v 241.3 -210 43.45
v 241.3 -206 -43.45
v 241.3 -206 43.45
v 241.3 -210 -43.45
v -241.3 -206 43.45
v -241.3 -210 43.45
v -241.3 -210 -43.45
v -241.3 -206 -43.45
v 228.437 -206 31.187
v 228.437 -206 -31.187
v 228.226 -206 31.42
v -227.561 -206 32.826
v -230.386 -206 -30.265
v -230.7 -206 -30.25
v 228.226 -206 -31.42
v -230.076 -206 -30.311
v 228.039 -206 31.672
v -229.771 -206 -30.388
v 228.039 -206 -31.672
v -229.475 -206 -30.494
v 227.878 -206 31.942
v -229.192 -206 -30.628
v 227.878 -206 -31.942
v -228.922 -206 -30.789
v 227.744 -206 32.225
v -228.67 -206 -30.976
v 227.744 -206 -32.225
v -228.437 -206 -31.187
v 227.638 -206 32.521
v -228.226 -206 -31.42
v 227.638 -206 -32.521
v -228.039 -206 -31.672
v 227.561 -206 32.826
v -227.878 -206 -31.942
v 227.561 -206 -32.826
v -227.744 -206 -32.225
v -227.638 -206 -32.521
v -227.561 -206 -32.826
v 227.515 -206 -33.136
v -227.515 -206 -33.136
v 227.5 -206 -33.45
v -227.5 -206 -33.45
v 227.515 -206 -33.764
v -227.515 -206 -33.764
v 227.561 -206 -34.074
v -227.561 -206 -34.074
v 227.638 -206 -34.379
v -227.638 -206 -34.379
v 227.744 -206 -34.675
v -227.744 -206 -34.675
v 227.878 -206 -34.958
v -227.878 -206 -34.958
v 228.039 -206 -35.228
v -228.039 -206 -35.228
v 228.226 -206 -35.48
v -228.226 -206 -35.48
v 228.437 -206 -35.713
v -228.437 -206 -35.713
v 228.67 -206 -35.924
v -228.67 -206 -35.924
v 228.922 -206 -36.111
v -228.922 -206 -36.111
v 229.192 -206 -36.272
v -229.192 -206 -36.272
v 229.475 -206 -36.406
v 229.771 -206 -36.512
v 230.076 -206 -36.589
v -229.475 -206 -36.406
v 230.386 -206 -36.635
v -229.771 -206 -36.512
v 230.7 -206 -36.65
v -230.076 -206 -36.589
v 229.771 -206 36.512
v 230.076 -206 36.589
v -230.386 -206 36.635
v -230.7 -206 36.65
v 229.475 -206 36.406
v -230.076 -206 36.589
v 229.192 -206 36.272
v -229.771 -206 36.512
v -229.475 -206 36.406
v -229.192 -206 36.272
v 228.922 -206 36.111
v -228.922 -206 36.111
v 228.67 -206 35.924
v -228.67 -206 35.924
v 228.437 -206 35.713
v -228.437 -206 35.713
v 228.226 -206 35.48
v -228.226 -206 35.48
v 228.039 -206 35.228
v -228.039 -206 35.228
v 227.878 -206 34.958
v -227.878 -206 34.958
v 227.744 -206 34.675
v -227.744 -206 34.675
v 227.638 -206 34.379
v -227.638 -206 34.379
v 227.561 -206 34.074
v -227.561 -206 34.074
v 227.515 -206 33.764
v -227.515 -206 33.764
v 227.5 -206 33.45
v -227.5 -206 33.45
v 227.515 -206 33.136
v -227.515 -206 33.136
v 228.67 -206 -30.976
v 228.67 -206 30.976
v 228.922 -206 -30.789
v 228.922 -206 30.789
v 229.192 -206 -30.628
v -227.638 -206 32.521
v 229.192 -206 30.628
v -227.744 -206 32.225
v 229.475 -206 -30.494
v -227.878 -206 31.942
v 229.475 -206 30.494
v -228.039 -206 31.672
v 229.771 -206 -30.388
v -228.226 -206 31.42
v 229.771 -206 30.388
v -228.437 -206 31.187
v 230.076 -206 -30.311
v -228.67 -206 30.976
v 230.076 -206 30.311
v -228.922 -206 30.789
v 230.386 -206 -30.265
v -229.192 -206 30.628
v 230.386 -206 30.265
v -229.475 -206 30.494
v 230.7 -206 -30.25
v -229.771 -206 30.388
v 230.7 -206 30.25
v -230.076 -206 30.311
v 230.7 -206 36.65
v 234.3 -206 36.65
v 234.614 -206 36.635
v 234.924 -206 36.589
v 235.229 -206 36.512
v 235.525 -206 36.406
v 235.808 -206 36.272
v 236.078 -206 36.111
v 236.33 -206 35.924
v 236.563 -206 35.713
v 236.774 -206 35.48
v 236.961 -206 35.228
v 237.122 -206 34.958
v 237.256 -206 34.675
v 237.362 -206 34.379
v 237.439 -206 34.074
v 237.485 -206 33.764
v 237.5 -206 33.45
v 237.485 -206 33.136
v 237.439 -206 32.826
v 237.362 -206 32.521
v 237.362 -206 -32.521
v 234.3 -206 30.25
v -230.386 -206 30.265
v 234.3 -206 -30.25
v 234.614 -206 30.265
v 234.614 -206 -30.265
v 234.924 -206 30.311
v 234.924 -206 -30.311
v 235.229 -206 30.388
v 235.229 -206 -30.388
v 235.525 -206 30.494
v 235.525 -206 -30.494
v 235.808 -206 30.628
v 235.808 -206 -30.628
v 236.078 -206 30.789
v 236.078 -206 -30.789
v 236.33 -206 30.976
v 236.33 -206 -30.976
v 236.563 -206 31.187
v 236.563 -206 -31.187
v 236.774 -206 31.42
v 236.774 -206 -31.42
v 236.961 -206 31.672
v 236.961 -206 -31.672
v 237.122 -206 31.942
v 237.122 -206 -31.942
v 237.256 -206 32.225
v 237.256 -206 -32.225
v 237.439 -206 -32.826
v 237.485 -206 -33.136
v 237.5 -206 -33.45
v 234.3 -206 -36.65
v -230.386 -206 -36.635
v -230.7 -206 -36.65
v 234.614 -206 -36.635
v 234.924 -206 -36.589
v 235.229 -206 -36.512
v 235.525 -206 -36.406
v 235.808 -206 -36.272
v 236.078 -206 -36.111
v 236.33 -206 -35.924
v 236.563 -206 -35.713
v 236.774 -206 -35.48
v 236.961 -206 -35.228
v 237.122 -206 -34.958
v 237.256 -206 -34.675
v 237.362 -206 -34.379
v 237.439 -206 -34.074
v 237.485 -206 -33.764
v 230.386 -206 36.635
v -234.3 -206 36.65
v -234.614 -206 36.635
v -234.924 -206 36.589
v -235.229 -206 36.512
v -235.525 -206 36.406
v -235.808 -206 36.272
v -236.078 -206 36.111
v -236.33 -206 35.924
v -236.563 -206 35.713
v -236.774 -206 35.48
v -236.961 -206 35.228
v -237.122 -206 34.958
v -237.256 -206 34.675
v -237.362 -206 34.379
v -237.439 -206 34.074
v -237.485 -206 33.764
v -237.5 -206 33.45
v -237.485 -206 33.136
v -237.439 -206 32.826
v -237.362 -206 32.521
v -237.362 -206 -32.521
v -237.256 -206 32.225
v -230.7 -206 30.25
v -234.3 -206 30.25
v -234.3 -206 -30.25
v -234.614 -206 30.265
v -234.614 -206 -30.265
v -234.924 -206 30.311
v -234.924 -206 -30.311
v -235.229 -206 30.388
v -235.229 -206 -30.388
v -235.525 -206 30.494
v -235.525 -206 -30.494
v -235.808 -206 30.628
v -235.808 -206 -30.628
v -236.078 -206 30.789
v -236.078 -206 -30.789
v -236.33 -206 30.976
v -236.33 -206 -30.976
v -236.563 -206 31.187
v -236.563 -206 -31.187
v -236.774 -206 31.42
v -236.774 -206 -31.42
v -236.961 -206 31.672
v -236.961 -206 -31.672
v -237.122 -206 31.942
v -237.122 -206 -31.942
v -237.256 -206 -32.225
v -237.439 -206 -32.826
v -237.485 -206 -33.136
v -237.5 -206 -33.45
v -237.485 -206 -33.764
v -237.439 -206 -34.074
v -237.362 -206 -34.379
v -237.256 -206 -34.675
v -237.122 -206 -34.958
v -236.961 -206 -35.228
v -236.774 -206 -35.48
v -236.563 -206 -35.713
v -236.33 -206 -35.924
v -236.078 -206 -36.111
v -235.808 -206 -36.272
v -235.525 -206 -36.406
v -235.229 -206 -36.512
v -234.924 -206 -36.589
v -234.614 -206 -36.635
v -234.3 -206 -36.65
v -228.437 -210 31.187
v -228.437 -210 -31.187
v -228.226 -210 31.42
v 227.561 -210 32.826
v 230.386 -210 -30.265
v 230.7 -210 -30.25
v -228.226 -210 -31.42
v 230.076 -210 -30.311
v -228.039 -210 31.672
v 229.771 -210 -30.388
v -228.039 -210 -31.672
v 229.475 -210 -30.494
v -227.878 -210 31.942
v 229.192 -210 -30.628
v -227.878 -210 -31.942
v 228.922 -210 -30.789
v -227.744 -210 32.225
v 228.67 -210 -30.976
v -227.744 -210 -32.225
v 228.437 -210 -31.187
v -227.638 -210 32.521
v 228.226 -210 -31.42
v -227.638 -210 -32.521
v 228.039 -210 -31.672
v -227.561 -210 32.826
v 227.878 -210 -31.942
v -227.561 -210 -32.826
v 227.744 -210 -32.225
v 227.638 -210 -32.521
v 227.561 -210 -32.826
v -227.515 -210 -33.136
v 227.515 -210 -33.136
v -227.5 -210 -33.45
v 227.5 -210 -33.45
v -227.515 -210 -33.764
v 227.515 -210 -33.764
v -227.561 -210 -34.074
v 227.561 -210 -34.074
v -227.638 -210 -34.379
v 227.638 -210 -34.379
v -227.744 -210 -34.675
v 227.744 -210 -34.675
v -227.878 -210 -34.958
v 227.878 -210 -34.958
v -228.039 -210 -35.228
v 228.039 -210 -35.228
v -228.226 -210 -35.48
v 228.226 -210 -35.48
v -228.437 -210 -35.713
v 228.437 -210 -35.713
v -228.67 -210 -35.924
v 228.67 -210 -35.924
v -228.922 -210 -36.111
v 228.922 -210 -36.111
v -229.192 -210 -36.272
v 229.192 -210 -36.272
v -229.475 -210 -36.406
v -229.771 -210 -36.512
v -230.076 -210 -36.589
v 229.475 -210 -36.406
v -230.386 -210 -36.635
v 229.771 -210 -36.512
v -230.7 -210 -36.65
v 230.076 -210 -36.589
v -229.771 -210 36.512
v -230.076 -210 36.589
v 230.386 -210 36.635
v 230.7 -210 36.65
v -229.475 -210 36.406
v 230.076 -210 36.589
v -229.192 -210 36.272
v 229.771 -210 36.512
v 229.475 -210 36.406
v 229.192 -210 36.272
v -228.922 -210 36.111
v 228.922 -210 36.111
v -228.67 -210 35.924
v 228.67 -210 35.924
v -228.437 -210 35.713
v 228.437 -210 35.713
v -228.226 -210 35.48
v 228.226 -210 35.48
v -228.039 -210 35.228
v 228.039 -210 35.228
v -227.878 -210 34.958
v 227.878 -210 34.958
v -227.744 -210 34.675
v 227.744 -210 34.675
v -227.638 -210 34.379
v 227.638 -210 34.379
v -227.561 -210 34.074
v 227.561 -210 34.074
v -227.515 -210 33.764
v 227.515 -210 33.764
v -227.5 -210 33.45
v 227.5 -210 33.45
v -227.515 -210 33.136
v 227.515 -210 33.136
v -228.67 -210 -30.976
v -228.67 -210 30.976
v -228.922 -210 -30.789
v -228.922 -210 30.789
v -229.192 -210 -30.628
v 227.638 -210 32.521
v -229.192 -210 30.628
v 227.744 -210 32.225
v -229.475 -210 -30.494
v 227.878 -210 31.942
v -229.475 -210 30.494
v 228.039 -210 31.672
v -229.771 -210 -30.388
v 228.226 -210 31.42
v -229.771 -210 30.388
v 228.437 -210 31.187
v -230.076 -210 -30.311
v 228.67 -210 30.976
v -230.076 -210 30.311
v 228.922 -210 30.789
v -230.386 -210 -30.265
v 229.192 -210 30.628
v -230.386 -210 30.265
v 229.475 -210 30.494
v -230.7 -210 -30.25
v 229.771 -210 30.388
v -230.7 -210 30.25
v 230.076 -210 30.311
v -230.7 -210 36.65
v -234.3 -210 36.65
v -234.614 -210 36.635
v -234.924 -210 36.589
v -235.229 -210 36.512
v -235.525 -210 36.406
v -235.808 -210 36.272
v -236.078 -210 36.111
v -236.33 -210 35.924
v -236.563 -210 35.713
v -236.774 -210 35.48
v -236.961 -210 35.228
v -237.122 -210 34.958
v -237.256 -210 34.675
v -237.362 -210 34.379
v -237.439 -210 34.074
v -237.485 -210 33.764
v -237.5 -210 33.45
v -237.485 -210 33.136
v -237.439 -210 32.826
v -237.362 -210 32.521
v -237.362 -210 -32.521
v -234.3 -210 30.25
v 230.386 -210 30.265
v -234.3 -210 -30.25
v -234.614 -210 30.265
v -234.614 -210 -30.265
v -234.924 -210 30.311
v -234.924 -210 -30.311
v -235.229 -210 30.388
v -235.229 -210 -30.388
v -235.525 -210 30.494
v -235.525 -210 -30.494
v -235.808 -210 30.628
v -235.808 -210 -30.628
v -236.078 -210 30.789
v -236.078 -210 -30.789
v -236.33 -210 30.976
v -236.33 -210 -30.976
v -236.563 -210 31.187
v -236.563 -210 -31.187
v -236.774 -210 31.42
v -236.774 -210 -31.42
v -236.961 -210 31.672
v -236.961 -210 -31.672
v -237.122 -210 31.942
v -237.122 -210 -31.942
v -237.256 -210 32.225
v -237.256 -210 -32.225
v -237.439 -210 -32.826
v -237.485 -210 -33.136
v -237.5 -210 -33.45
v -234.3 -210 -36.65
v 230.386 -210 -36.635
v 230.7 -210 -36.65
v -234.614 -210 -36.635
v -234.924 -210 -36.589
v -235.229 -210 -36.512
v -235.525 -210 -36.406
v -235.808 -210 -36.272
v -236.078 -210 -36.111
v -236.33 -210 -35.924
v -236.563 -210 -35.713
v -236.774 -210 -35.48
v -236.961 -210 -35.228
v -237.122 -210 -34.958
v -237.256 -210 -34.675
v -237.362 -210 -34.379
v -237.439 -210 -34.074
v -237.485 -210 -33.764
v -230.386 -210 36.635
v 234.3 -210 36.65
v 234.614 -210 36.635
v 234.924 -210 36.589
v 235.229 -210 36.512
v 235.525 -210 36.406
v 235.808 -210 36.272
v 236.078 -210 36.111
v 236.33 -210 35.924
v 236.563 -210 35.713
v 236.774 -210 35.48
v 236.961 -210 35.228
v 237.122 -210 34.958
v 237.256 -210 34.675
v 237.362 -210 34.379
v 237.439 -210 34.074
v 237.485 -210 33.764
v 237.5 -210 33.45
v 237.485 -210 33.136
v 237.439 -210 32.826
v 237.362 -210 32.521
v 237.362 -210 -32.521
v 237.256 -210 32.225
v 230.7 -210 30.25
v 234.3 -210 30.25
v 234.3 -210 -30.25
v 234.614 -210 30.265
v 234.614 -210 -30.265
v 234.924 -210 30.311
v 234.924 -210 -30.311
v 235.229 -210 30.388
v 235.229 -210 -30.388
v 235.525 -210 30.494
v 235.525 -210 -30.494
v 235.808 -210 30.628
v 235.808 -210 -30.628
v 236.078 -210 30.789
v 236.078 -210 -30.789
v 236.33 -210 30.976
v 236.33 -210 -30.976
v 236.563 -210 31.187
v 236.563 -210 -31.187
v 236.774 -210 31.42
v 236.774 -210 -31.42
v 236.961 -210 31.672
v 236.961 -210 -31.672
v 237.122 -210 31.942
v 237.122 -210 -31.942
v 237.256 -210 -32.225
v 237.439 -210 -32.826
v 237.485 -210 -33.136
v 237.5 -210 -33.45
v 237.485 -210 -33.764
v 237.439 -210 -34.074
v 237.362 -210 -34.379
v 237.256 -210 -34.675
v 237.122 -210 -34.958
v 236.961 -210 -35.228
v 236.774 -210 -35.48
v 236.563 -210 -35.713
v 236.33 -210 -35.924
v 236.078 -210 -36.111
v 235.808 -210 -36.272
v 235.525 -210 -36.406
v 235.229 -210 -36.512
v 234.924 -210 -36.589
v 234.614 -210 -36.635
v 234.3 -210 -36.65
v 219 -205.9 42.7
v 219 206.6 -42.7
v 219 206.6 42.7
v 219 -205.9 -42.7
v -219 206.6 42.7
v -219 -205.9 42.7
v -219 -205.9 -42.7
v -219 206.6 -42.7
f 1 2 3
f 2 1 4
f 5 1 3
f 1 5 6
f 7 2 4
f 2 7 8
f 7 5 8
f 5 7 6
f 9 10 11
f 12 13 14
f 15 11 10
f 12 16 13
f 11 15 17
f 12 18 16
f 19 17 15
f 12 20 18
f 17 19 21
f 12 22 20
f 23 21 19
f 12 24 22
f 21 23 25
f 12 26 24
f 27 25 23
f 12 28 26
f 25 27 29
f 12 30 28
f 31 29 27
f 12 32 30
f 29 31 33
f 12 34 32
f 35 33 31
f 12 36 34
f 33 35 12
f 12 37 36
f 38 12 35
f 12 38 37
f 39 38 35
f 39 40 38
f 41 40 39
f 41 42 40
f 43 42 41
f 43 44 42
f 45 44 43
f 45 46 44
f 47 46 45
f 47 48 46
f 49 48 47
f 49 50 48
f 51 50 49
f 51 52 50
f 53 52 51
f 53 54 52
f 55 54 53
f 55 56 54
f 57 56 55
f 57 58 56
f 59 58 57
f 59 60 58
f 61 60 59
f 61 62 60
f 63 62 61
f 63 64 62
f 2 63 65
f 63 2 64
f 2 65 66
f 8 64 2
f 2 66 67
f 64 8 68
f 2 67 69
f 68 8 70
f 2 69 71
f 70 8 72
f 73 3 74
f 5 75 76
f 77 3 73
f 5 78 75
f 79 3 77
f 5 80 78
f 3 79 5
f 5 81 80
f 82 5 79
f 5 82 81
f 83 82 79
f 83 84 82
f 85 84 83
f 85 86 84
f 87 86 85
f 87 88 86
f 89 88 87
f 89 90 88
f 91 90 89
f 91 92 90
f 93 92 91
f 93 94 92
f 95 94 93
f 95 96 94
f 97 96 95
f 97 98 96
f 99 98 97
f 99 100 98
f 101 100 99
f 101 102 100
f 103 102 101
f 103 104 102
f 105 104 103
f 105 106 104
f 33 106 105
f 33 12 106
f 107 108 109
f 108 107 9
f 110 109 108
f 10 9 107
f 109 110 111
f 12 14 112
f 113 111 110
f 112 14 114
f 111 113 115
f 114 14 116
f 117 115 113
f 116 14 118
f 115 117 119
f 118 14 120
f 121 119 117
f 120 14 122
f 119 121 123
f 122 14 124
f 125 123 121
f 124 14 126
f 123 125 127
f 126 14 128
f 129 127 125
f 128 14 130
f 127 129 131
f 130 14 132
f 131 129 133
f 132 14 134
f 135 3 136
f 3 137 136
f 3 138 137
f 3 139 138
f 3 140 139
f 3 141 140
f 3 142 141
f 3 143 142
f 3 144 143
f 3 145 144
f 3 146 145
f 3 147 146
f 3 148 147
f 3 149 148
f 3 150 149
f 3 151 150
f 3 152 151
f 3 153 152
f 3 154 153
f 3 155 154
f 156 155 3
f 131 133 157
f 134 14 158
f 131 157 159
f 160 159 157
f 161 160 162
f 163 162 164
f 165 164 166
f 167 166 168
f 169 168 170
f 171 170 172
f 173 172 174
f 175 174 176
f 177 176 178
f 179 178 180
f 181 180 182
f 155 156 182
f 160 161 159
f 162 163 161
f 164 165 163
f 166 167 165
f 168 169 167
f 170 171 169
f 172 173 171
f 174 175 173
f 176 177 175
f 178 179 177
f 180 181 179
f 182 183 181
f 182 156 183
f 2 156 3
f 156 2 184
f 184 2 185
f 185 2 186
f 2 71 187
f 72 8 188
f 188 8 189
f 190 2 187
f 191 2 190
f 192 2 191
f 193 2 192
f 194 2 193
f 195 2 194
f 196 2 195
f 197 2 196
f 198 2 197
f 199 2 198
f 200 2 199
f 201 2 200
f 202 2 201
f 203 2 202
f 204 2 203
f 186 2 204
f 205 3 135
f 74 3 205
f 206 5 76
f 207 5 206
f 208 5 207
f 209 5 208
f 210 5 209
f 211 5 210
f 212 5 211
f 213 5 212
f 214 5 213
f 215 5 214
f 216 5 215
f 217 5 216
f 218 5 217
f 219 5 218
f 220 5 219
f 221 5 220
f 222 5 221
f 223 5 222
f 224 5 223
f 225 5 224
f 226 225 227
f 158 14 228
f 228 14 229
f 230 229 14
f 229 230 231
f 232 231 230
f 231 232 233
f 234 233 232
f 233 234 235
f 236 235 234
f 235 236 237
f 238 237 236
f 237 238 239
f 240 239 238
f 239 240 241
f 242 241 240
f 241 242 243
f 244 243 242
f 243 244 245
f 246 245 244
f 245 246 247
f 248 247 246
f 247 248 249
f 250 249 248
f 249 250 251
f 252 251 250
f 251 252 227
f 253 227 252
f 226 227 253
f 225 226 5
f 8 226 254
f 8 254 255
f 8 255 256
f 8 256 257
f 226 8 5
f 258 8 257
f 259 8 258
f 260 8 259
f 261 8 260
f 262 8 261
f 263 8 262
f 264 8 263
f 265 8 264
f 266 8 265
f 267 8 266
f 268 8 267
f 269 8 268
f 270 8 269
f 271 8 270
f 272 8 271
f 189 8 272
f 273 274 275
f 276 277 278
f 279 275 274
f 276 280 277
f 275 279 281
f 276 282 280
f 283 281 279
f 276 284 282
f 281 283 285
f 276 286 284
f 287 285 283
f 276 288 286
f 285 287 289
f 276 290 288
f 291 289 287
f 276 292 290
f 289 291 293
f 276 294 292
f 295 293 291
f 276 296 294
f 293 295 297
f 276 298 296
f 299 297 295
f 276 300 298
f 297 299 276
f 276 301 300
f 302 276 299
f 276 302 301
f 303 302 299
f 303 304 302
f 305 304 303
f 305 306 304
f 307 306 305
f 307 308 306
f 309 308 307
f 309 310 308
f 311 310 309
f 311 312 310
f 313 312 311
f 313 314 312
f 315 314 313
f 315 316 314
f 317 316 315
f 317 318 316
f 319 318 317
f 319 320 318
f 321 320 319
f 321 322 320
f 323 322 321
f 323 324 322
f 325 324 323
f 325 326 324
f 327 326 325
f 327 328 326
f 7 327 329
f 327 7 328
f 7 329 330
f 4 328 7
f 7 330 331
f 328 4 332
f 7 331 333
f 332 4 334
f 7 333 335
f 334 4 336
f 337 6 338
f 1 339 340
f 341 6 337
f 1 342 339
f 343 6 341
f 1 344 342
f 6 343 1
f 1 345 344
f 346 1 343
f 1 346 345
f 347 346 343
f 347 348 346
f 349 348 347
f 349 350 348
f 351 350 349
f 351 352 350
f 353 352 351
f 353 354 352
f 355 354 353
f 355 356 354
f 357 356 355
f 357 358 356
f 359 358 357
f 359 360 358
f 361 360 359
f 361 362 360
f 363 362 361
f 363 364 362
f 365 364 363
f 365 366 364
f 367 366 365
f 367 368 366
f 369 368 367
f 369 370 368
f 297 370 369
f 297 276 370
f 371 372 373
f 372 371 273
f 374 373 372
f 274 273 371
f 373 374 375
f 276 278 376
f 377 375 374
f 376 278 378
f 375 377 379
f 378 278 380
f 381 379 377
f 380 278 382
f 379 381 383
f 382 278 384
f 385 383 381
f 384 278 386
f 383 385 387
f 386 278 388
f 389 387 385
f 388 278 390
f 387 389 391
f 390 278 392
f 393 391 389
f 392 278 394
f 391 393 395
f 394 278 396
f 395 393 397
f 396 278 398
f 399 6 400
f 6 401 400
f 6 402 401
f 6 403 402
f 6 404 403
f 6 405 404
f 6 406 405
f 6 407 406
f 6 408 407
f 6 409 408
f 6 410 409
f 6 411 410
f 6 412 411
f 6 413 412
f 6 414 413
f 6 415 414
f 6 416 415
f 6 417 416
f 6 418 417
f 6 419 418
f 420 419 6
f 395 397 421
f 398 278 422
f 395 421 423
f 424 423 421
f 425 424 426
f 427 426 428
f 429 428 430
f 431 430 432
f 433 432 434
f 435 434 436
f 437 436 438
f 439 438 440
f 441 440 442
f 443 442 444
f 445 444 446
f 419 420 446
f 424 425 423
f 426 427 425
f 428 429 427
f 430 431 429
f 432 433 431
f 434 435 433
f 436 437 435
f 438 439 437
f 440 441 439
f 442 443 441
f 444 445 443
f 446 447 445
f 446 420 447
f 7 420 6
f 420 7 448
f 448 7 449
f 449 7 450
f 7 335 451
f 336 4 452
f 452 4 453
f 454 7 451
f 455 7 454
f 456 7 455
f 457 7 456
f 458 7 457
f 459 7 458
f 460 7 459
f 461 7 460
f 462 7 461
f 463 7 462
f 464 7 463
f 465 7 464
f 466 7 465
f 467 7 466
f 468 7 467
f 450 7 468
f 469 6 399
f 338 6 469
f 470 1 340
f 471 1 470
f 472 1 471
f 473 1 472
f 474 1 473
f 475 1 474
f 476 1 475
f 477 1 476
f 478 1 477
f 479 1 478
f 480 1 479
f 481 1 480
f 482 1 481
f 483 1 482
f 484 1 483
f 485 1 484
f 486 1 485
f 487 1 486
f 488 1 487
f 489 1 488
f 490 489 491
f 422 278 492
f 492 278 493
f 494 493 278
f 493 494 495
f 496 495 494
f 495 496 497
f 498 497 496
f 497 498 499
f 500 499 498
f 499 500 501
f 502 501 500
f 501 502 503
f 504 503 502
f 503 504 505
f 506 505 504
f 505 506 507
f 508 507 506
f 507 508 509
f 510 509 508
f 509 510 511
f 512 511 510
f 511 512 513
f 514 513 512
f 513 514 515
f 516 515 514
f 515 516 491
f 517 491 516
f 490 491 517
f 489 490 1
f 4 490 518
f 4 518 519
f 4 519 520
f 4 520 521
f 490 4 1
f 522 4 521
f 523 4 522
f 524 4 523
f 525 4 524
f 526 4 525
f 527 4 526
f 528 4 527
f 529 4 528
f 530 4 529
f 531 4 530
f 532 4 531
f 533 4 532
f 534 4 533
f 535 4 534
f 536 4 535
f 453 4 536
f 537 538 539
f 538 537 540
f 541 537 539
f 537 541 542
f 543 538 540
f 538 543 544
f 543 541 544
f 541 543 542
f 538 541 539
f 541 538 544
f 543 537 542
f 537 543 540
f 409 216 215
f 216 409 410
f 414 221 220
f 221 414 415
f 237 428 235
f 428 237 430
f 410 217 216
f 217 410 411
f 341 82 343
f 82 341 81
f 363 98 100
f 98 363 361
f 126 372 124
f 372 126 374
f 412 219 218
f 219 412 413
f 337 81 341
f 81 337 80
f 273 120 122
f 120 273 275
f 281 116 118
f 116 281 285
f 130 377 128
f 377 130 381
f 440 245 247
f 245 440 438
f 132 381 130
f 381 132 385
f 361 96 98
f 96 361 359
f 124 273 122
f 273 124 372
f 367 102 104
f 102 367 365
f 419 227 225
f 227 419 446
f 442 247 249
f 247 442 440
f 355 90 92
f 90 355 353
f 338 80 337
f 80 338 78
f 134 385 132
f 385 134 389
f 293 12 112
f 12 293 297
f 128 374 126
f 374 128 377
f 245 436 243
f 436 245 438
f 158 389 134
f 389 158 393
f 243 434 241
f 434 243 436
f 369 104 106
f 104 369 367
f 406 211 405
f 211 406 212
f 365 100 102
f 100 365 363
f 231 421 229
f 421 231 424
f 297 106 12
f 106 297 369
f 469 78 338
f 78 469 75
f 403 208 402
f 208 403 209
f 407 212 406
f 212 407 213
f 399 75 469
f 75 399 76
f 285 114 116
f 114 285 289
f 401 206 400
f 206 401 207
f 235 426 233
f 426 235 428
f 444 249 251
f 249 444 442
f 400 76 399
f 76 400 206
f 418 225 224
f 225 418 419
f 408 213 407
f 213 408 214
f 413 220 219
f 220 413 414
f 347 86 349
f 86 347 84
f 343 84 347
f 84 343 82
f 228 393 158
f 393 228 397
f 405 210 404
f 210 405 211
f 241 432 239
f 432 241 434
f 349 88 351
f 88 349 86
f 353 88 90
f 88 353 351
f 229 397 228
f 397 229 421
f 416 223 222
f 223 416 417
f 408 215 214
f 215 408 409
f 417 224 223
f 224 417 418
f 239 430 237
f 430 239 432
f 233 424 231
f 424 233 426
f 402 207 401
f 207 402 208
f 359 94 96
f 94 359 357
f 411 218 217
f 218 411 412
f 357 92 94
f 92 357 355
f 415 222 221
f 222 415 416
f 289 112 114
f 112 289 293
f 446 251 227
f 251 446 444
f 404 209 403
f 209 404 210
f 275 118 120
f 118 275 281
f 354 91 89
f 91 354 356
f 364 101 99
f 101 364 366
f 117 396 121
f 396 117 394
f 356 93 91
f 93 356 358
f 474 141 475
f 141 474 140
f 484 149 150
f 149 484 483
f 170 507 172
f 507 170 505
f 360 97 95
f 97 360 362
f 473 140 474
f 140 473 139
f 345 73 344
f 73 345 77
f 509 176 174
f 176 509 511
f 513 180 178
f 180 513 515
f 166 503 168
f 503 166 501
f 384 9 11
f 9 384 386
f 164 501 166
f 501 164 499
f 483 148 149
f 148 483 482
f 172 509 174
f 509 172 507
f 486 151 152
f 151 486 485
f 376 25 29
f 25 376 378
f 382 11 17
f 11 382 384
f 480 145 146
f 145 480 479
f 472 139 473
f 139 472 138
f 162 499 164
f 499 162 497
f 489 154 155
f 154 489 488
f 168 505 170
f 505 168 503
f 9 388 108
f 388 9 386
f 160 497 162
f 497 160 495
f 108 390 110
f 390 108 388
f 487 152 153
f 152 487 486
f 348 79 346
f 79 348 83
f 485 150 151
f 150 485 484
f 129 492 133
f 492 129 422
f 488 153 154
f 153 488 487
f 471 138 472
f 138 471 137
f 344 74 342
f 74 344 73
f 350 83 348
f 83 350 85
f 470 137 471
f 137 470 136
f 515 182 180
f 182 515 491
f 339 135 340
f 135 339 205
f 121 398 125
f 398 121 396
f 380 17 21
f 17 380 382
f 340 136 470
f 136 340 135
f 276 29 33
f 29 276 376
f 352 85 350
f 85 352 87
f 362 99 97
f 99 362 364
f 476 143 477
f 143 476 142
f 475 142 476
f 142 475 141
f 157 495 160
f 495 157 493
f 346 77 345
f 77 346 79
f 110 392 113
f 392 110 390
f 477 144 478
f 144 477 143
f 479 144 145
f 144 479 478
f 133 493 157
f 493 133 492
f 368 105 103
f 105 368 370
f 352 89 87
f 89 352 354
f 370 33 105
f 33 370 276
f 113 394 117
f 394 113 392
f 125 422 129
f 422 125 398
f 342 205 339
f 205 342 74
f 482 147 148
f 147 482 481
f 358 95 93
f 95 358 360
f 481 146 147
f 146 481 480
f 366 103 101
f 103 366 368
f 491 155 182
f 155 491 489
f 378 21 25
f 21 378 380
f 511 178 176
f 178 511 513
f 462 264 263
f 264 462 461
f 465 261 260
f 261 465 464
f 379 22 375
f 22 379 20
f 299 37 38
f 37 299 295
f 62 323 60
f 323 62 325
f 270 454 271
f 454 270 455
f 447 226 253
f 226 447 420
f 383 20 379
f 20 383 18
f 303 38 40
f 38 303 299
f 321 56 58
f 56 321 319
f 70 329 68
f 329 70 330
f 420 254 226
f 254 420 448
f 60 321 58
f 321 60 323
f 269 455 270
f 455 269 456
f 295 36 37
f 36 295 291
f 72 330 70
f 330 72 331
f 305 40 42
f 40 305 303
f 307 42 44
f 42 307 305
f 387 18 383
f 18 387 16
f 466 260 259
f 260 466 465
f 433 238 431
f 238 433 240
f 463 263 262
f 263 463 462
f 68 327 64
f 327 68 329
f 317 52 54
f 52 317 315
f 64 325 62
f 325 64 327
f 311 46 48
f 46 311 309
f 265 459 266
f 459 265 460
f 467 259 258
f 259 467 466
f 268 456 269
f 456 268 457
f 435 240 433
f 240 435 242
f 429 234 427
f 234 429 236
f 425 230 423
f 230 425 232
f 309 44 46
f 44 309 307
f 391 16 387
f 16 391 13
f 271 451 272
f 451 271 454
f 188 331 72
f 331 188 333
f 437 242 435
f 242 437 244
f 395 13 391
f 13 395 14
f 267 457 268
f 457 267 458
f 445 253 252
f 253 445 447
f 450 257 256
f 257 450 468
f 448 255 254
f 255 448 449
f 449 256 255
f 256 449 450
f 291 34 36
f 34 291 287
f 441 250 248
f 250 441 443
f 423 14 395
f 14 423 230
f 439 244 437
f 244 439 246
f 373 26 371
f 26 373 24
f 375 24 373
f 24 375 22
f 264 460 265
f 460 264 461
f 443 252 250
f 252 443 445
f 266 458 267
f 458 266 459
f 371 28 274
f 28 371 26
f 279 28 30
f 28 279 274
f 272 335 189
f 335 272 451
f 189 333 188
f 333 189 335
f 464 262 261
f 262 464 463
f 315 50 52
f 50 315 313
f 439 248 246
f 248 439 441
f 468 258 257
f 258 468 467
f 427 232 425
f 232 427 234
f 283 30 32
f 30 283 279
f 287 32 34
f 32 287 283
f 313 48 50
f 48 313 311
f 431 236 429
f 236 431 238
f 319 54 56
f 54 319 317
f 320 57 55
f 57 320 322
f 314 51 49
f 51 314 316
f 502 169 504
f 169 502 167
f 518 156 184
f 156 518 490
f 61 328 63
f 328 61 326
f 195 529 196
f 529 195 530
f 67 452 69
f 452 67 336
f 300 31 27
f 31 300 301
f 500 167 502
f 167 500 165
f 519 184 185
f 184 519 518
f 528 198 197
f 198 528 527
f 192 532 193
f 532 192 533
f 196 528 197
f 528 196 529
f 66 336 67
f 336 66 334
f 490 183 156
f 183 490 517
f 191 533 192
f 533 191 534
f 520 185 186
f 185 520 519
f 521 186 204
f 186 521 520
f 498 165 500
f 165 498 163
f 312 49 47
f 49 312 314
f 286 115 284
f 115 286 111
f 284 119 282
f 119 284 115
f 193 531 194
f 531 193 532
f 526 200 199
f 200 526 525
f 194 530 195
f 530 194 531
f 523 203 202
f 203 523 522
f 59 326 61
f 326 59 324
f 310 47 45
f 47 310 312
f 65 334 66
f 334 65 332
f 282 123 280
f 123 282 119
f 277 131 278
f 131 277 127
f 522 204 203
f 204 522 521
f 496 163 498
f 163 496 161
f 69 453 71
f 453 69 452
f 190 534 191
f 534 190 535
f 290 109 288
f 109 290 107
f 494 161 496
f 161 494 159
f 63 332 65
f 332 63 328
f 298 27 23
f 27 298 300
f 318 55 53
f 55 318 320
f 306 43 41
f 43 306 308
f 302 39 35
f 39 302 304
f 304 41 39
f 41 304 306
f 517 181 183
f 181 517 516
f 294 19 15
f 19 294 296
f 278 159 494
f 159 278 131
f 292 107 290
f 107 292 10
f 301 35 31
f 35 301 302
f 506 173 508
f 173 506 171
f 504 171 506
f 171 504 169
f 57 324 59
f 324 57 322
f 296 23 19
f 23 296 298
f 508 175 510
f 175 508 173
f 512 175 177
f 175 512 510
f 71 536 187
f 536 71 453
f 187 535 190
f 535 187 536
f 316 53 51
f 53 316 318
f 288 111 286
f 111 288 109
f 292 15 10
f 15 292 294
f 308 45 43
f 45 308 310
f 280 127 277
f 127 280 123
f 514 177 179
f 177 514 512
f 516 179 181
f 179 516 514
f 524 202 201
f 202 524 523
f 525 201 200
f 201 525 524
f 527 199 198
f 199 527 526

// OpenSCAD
// ============================================================================
// Atom Lithography Machine — Parametric OpenSCAD Module (S4.3-04)
// ============================================================================
// part_id           : S4.3-04
// parent_bom_id     : S4.3
// subsystem         : S4
// part_name         : 6-kanalli dusuk gurultulu piezo servo denetleyici ve HV surucu
// material          : Al 6061
// temp_stage        : 300 K (kabin)
// vacuum_grade      : Atmosfer
// tolerance         : ±0.1 nm
// computed_mass_kg  : 10.41037
// envelope_mm       : 482.600 x 463.000 x 86.900
// design_maturity   : M0_M1_DETAILED_CAD_DESIGN_ONLY
// no_lab_measurement: true
// iec61508_certified: false
// semi_s2_certified : false
// Units: millimeters (mm)
// ============================================================================

$fn = 64;

// Nominal bounding envelope parameters (mm)
bbox_x = 482.6000;
bbox_y = 463.0000;
bbox_z = 86.9000;

// Part-specific parametric dimensions
rack_u_height = 2;
n_piezo_channels = 6;
dac_bits = 24;
depth_mm = 420.0;

// Interface / port parameters (mm)

module part_S4_3_04() {
  difference() {
    union() {
      // 19-inch EIA-310 2U front bezel (facing -Y)
      translate([0.000, -208.000, 0.000]) cube([482.600, 4.000, 86.900], center=true);
      // Hollow EMI rack body
      translate([0.000, 0.350, 0.000]) cube([438.000, 412.500, 85.400], center=true);
    }
    // EIA-310 upper-left ear slot
    translate([-232.500, -208.000, 33.450]) rotate([90.000, 0.000, 0.000]) {
      hull() {
        translate([-1.800, 0, 0]) cylinder(d=6.400, h=8.000, center=true);
        translate([1.800, 0, 0]) cylinder(d=6.400, h=8.000, center=true);
      }
    }
    // EIA-310 upper-right ear slot
    translate([232.500, -208.000, 33.450]) rotate([90.000, 0.000, 0.000]) {
      hull() {
        translate([-1.800, 0, 0]) cylinder(d=6.400, h=8.000, center=true);
        translate([1.800, 0, 0]) cylinder(d=6.400, h=8.000, center=true);
      }
    }
    // EIA-310 lower-left ear slot
    translate([-232.500, -208.000, -33.450]) rotate([90.000, 0.000, 0.000]) {
      hull() {
        translate([-1.800, 0, 0]) cylinder(d=6.400, h=8.000, center=true);
        translate([1.800, 0, 0]) cylinder(d=6.400, h=8.000, center=true);
      }
    }
    // EIA-310 lower-right ear slot
    translate([232.500, -208.000, -33.450]) rotate([90.000, 0.000, 0.000]) {
      hull() {
        translate([-1.800, 0, 0]) cylinder(d=6.400, h=8.000, center=true);
        translate([1.800, 0, 0]) cylinder(d=6.400, h=8.000, center=true);
      }
    }
  }
}

// World assembly mounting transform (global machine frame, mm / deg):
// translate([1480.000, -200.000, 256.750]) rotate([0.000, 0.000, 0.000]) part_S4_3_04();

part_S4_3_04();
